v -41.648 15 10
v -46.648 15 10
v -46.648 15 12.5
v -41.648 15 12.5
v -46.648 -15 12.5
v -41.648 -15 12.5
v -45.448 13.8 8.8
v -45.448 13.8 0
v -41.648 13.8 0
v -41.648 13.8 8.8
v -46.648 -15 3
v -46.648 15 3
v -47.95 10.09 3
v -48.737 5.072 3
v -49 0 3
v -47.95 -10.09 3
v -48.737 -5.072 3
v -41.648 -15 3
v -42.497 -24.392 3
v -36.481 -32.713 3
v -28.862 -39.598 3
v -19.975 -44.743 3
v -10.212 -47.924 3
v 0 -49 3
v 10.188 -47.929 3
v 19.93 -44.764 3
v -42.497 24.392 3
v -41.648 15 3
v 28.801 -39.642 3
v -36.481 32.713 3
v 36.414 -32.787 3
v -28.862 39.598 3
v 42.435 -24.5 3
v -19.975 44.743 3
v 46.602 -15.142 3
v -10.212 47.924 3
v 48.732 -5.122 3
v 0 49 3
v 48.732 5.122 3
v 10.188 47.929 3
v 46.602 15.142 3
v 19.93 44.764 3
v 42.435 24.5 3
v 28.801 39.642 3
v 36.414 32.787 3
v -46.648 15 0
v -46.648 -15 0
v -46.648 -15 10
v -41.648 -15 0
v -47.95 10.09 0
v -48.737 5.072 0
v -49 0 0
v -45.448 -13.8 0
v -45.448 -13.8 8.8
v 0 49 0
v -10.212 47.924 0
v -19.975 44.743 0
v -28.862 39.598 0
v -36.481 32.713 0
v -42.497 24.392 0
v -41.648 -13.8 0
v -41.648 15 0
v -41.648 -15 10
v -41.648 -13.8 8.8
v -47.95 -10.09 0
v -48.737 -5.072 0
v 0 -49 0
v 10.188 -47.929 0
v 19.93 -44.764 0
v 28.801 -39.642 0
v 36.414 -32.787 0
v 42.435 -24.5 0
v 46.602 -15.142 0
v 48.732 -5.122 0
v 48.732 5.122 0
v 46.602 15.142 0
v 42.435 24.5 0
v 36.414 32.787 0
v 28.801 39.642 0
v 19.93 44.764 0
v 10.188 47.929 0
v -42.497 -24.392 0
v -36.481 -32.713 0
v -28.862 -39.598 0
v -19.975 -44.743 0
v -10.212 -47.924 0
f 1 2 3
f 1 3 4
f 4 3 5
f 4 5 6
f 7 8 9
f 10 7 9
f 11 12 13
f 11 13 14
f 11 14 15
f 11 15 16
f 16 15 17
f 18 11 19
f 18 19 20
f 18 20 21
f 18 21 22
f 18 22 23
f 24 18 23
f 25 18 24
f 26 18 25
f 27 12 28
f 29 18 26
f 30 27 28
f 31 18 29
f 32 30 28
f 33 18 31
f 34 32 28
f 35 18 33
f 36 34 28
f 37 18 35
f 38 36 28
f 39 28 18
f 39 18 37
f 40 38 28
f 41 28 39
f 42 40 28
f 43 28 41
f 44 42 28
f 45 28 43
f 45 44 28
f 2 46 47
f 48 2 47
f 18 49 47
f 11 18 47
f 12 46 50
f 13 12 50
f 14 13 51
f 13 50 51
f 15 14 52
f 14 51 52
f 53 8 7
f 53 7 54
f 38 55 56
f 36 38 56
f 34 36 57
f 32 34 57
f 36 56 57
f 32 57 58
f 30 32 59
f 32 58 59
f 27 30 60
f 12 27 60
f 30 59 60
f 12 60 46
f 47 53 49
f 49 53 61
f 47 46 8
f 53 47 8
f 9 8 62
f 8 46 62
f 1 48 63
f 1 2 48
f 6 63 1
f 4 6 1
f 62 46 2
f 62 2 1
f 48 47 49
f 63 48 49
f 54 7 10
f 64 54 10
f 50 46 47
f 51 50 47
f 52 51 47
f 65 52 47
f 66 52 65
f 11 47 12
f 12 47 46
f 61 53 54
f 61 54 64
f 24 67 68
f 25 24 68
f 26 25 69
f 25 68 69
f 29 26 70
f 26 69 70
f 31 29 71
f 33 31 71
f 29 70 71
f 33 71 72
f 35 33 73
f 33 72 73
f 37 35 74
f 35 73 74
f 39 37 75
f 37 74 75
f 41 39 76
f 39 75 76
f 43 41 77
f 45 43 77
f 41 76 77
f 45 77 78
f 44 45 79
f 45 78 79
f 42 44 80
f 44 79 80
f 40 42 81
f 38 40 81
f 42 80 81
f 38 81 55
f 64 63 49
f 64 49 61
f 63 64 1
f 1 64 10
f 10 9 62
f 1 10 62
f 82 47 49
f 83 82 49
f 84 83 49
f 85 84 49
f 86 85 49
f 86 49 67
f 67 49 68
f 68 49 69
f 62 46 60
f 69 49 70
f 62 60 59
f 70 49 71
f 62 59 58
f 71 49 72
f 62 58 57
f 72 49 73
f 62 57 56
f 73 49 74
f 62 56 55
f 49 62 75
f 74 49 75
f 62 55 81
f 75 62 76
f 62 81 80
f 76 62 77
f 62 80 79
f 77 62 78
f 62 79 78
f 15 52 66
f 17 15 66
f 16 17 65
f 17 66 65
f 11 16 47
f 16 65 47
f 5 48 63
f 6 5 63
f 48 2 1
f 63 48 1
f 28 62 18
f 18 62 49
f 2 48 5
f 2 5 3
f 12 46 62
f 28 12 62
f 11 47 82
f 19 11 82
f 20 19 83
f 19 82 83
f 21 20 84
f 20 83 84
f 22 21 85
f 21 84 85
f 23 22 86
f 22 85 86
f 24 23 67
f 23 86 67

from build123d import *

# Parameters (mm, degrees)
F1_DEPTH = 3
F0_W     = 5
F0_H     = 15
F2_DEPTH = 10
F4_W     = 5
F4_H     = 30
F5_DEPTH = 2.5
F9_T     = -1.2


with BuildPart() as f1:
    # F0 (on Top) → F1 (new body)
    with BuildSketch(Plane.XY):
        with BuildLine():
            Line((-41.6476151588, 15), (-41.6476151588, 0))
            Line((-41.6476151588, 0), (-41.6476151588, -15))
            Line((-41.6476151588, -15), (-46.6476151588, -15))
            ThreePointArc((-46.6476151588, -15), (-28.8617393793, -39.5979797464), (0, -49))
            ThreePointArc((0, -49), (49, 0), (0, 49))
            ThreePointArc((0, 49), (-28.8617393793, 39.5979797464), (-46.6476151588, 15))
            Line((-46.6476151588, 15), (-41.6476151588, 15))
        make_face()
    extrude(amount=-F1_DEPTH)


with BuildPart() as f1b:
    # F0 (on Top) → F1, piece 2 (new body)
    with BuildSketch(Plane.XY):
        with BuildLine():
            Line((-46.6476151588, -15), (-46.6476151588, 0))
            Line((-46.6476151588, 0), (-49, 0))
            ThreePointArc((-49, 0), (-48.408331632, -7.591668368), (-46.6476151588, -15))
        make_face()
        with BuildLine():
            Line((-49, 0), (-46.6476151588, 0))
            Line((-46.6476151588, 0), (-46.6476151588, 15))
            ThreePointArc((-46.6476151588, 15), (-48.408331632, 7.591668368), (-49, 0))
        make_face()
    extrude(amount=-F1_DEPTH)


with BuildPart() as f2:
    # F0 (on Top) → F2 (new body)
    with BuildSketch(Plane.XY):
        with Locations((-44.1476151588, -7.5)):
            Rectangle(F0_W, F0_H)
        with Locations((-44.1476151588, 7.5)):
            Rectangle(F0_W, F0_H)
    extrude(amount=-F2_DEPTH)


with BuildPart() as f5:
    # F4 (on offset) → F5 (new body)
    with BuildSketch(Plane.XY.offset(-10)):
        with Locations((-44.1476151588, 0)):
            Rectangle(F4_W, F4_H)
    extrude(amount=-F5_DEPTH)


with BuildPart() as f6_1:
    # F6: instance of F1
    add(f1.part.mirror(Plane.XY))


with BuildPart() as f6_2:
    # F6: instance of F1b
    add(f1b.part.mirror(Plane.XY))


with BuildPart() as f6_3:
    # F6: instance of F5
    add(f5.part.mirror(Plane.XY))


with BuildPart() as f6_4:
    # F6: instance of F2
    add(f2.part.mirror(Plane.XY))

    # F9
    f9_openings = [f6_4.faces().sort_by_distance(p)[0] for p in [
        (-41.647615, 0, 5),
        (-44.147615, 0, 0),
    ]]
    offset(amount=F9_T, openings=f9_openings)


solid = Compound([f6_1.part, f6_2.part, f6_3.part, f6_4.part])
